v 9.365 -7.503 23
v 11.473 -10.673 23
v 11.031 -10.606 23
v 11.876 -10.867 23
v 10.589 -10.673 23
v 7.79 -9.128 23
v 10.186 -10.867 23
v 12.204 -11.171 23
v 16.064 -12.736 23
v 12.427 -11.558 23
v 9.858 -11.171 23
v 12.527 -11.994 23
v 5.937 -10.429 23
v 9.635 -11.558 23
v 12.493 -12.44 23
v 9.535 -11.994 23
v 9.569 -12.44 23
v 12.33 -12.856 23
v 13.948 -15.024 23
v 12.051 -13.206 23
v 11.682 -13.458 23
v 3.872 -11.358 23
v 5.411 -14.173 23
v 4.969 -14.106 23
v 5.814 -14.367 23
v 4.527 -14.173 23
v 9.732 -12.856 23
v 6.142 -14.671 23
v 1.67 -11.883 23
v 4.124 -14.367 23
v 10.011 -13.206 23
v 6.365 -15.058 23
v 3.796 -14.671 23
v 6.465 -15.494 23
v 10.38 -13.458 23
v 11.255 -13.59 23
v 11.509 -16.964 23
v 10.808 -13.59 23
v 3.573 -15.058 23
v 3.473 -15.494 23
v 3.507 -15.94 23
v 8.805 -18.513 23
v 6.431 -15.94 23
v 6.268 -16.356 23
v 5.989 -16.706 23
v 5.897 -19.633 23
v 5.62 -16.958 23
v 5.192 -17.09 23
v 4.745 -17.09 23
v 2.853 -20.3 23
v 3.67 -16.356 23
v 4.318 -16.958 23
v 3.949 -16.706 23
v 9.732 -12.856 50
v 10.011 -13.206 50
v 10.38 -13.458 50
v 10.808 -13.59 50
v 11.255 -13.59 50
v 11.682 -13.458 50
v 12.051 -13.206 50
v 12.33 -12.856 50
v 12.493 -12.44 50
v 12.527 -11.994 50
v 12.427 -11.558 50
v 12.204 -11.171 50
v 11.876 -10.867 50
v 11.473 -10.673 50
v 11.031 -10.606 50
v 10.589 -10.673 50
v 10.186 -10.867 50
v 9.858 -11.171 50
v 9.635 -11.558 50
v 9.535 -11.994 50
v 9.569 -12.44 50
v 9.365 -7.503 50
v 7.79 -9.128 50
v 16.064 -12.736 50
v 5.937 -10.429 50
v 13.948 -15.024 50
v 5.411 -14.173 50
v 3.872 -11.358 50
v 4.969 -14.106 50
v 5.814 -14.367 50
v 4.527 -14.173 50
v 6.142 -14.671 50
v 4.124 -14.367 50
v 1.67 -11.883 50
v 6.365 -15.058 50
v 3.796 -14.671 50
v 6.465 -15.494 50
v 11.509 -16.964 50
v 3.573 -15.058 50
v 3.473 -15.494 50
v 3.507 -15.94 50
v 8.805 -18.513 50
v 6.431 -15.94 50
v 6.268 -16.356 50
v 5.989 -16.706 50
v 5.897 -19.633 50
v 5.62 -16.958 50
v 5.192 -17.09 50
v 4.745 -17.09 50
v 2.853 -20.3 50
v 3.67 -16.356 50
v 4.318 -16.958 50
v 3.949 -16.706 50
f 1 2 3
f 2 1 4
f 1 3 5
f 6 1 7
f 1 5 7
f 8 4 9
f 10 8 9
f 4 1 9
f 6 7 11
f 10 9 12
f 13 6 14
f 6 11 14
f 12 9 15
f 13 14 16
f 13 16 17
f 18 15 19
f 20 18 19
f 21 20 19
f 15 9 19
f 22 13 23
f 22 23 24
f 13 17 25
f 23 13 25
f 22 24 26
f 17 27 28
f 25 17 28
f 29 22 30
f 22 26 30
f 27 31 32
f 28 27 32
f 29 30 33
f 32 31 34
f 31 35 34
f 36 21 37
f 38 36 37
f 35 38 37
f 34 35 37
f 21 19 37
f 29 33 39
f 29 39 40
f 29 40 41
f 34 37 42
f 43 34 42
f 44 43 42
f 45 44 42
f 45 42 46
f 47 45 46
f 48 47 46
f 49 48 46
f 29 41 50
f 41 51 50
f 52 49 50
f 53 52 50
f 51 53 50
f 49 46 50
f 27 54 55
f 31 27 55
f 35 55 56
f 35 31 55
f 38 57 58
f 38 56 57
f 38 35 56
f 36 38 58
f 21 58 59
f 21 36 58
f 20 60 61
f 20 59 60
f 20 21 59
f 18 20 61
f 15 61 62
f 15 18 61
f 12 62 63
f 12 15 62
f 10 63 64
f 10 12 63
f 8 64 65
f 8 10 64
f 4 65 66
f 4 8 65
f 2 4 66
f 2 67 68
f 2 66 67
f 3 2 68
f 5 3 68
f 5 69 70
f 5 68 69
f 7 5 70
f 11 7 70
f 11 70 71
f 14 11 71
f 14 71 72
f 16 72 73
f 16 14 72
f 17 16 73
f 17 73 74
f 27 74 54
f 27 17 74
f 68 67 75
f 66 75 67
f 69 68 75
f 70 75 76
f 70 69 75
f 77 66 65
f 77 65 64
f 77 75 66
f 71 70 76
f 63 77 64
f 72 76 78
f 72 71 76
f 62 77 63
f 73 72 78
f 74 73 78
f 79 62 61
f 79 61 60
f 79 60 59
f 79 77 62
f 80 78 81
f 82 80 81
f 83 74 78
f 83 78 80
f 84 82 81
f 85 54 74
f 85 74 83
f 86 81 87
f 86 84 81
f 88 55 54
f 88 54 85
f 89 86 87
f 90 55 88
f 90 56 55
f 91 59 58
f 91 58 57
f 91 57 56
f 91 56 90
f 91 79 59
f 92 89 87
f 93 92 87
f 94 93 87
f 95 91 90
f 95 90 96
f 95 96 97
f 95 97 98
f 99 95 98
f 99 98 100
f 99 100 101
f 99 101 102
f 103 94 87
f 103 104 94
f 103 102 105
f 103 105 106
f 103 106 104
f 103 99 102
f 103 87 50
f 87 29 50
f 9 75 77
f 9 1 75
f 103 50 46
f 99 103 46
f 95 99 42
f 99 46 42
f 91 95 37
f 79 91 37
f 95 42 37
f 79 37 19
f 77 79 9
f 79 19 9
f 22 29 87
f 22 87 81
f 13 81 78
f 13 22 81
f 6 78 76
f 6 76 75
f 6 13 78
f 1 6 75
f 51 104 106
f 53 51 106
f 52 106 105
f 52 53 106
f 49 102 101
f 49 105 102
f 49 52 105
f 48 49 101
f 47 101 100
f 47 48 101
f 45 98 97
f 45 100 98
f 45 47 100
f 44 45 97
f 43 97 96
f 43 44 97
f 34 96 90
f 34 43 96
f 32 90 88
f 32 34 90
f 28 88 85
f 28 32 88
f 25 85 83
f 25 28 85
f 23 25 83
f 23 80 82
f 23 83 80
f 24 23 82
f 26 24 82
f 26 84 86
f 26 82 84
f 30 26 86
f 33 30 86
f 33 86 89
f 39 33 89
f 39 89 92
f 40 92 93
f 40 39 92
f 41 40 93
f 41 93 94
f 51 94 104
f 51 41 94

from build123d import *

# Parameters (mm, degrees)
CYLINDER860_R          = 1.5
CYLINDER860_DEPTH      = 60
CYLINDER859_R          = 1.5
CYLINDER859_DEPTH      = 60
BOX336_W               = 20
BOX336_H               = 40
BOX336_DEPTH           = 60
BOX336_PLACEMENT_ANGLE = 22
BOX410_W               = 20
BOX410_H               = 40
BOX410_DEPTH           = 60
BOX410_PLACEMENT_ANGLE = 22
BOX335_W               = 60
BOX335_H               = 40
BOX335_DEPTH           = 60
TUBE037_R              = 20.5
TUBE037_R_2            = 12
TUBE037_DEPTH          = 27
CUT470_PLACEMENT_ANGLE = 210


with BuildPart() as v_lec860:
    # Cylinder860 → Cylinder860 (new body)
    with BuildSketch(Plane(origin=(-3.5, 16, 0), x_dir=(1, 0, 0), z_dir=(0, 0, 1))):
        Circle(CYLINDER860_R)
    extrude(amount=CYLINDER860_DEPTH)


with BuildPart() as compound565:
    # Cylinder859 → Cylinder859 (new body)
    with BuildSketch(Plane(origin=(3.5, 16, 0), x_dir=(1, 0, 0), z_dir=(0, 0, 1))):
        Circle(CYLINDER859_R)
    extrude(amount=CYLINDER859_DEPTH)

    # Compound565: union Válec860
    add(v_lec860.part)


with BuildPart() as krychle336:
    # Box336 → Box336 (new body)
    with BuildSketch(Plane.XY):
        with Locations((10, 20)):
            Rectangle(BOX336_W, BOX336_H)
    extrude(amount=BOX336_DEPTH)


with BuildPart() as krychle336_1:
    # Box336 placement: moved
    add(krychle336.part.rotate(Axis((0, 0, 0), (0, 0, -1)), BOX336_PLACEMENT_ANGLE))


with BuildPart() as krychle410:
    # Box410 → Box410 (new body)
    with BuildSketch(Plane.XY):
        with Locations((10, 20)):
            Rectangle(BOX410_W, BOX410_H)
    extrude(amount=BOX410_DEPTH)


with BuildPart() as krychle410_1:
    # Box410 placement: moved
    add(krychle410.part.moved(Location((-19.32, -5.18, 0))).rotate(Axis((-19.32, -5.18, 0), (0, 0, 1)), BOX410_PLACEMENT_ANGLE))


with BuildPart() as krychle335:
    # Box335 → Box335 (new body)
    with BuildSketch(Plane(origin=(-30, -35, 0), x_dir=(1, 0, 0), z_dir=(0, 0, 1))):
        with Locations((30, 20)):
            Rectangle(BOX335_W, BOX335_H)
    extrude(amount=BOX335_DEPTH)


with BuildPart() as cut470:
    # Tube037 → Tube037 (new body)
    with BuildSketch(Plane.XY.offset(23)):
        Circle(TUBE037_R)
        Circle(TUBE037_R_2, mode=Mode.SUBTRACT)
    extrude(amount=TUBE037_DEPTH)

    # Cut355: cut Krychle335
    add(krychle335.part, mode=Mode.SUBTRACT)

    # Cut357: cut Krychle410
    add(krychle410_1.part, mode=Mode.SUBTRACT)

    # Cut358: cut Krychle336
    add(krychle336_1.part, mode=Mode.SUBTRACT)

    # Cut470: cut Compound565
    add(compound565.part, mode=Mode.SUBTRACT)


with BuildPart() as cut470_1:
    # Cut470 placement: moved
    add(cut470.part.rotate(Axis((0, 0, 0), (0, 0, 1)), CUT470_PLACEMENT_ANGLE))


solid = cut470_1.part
